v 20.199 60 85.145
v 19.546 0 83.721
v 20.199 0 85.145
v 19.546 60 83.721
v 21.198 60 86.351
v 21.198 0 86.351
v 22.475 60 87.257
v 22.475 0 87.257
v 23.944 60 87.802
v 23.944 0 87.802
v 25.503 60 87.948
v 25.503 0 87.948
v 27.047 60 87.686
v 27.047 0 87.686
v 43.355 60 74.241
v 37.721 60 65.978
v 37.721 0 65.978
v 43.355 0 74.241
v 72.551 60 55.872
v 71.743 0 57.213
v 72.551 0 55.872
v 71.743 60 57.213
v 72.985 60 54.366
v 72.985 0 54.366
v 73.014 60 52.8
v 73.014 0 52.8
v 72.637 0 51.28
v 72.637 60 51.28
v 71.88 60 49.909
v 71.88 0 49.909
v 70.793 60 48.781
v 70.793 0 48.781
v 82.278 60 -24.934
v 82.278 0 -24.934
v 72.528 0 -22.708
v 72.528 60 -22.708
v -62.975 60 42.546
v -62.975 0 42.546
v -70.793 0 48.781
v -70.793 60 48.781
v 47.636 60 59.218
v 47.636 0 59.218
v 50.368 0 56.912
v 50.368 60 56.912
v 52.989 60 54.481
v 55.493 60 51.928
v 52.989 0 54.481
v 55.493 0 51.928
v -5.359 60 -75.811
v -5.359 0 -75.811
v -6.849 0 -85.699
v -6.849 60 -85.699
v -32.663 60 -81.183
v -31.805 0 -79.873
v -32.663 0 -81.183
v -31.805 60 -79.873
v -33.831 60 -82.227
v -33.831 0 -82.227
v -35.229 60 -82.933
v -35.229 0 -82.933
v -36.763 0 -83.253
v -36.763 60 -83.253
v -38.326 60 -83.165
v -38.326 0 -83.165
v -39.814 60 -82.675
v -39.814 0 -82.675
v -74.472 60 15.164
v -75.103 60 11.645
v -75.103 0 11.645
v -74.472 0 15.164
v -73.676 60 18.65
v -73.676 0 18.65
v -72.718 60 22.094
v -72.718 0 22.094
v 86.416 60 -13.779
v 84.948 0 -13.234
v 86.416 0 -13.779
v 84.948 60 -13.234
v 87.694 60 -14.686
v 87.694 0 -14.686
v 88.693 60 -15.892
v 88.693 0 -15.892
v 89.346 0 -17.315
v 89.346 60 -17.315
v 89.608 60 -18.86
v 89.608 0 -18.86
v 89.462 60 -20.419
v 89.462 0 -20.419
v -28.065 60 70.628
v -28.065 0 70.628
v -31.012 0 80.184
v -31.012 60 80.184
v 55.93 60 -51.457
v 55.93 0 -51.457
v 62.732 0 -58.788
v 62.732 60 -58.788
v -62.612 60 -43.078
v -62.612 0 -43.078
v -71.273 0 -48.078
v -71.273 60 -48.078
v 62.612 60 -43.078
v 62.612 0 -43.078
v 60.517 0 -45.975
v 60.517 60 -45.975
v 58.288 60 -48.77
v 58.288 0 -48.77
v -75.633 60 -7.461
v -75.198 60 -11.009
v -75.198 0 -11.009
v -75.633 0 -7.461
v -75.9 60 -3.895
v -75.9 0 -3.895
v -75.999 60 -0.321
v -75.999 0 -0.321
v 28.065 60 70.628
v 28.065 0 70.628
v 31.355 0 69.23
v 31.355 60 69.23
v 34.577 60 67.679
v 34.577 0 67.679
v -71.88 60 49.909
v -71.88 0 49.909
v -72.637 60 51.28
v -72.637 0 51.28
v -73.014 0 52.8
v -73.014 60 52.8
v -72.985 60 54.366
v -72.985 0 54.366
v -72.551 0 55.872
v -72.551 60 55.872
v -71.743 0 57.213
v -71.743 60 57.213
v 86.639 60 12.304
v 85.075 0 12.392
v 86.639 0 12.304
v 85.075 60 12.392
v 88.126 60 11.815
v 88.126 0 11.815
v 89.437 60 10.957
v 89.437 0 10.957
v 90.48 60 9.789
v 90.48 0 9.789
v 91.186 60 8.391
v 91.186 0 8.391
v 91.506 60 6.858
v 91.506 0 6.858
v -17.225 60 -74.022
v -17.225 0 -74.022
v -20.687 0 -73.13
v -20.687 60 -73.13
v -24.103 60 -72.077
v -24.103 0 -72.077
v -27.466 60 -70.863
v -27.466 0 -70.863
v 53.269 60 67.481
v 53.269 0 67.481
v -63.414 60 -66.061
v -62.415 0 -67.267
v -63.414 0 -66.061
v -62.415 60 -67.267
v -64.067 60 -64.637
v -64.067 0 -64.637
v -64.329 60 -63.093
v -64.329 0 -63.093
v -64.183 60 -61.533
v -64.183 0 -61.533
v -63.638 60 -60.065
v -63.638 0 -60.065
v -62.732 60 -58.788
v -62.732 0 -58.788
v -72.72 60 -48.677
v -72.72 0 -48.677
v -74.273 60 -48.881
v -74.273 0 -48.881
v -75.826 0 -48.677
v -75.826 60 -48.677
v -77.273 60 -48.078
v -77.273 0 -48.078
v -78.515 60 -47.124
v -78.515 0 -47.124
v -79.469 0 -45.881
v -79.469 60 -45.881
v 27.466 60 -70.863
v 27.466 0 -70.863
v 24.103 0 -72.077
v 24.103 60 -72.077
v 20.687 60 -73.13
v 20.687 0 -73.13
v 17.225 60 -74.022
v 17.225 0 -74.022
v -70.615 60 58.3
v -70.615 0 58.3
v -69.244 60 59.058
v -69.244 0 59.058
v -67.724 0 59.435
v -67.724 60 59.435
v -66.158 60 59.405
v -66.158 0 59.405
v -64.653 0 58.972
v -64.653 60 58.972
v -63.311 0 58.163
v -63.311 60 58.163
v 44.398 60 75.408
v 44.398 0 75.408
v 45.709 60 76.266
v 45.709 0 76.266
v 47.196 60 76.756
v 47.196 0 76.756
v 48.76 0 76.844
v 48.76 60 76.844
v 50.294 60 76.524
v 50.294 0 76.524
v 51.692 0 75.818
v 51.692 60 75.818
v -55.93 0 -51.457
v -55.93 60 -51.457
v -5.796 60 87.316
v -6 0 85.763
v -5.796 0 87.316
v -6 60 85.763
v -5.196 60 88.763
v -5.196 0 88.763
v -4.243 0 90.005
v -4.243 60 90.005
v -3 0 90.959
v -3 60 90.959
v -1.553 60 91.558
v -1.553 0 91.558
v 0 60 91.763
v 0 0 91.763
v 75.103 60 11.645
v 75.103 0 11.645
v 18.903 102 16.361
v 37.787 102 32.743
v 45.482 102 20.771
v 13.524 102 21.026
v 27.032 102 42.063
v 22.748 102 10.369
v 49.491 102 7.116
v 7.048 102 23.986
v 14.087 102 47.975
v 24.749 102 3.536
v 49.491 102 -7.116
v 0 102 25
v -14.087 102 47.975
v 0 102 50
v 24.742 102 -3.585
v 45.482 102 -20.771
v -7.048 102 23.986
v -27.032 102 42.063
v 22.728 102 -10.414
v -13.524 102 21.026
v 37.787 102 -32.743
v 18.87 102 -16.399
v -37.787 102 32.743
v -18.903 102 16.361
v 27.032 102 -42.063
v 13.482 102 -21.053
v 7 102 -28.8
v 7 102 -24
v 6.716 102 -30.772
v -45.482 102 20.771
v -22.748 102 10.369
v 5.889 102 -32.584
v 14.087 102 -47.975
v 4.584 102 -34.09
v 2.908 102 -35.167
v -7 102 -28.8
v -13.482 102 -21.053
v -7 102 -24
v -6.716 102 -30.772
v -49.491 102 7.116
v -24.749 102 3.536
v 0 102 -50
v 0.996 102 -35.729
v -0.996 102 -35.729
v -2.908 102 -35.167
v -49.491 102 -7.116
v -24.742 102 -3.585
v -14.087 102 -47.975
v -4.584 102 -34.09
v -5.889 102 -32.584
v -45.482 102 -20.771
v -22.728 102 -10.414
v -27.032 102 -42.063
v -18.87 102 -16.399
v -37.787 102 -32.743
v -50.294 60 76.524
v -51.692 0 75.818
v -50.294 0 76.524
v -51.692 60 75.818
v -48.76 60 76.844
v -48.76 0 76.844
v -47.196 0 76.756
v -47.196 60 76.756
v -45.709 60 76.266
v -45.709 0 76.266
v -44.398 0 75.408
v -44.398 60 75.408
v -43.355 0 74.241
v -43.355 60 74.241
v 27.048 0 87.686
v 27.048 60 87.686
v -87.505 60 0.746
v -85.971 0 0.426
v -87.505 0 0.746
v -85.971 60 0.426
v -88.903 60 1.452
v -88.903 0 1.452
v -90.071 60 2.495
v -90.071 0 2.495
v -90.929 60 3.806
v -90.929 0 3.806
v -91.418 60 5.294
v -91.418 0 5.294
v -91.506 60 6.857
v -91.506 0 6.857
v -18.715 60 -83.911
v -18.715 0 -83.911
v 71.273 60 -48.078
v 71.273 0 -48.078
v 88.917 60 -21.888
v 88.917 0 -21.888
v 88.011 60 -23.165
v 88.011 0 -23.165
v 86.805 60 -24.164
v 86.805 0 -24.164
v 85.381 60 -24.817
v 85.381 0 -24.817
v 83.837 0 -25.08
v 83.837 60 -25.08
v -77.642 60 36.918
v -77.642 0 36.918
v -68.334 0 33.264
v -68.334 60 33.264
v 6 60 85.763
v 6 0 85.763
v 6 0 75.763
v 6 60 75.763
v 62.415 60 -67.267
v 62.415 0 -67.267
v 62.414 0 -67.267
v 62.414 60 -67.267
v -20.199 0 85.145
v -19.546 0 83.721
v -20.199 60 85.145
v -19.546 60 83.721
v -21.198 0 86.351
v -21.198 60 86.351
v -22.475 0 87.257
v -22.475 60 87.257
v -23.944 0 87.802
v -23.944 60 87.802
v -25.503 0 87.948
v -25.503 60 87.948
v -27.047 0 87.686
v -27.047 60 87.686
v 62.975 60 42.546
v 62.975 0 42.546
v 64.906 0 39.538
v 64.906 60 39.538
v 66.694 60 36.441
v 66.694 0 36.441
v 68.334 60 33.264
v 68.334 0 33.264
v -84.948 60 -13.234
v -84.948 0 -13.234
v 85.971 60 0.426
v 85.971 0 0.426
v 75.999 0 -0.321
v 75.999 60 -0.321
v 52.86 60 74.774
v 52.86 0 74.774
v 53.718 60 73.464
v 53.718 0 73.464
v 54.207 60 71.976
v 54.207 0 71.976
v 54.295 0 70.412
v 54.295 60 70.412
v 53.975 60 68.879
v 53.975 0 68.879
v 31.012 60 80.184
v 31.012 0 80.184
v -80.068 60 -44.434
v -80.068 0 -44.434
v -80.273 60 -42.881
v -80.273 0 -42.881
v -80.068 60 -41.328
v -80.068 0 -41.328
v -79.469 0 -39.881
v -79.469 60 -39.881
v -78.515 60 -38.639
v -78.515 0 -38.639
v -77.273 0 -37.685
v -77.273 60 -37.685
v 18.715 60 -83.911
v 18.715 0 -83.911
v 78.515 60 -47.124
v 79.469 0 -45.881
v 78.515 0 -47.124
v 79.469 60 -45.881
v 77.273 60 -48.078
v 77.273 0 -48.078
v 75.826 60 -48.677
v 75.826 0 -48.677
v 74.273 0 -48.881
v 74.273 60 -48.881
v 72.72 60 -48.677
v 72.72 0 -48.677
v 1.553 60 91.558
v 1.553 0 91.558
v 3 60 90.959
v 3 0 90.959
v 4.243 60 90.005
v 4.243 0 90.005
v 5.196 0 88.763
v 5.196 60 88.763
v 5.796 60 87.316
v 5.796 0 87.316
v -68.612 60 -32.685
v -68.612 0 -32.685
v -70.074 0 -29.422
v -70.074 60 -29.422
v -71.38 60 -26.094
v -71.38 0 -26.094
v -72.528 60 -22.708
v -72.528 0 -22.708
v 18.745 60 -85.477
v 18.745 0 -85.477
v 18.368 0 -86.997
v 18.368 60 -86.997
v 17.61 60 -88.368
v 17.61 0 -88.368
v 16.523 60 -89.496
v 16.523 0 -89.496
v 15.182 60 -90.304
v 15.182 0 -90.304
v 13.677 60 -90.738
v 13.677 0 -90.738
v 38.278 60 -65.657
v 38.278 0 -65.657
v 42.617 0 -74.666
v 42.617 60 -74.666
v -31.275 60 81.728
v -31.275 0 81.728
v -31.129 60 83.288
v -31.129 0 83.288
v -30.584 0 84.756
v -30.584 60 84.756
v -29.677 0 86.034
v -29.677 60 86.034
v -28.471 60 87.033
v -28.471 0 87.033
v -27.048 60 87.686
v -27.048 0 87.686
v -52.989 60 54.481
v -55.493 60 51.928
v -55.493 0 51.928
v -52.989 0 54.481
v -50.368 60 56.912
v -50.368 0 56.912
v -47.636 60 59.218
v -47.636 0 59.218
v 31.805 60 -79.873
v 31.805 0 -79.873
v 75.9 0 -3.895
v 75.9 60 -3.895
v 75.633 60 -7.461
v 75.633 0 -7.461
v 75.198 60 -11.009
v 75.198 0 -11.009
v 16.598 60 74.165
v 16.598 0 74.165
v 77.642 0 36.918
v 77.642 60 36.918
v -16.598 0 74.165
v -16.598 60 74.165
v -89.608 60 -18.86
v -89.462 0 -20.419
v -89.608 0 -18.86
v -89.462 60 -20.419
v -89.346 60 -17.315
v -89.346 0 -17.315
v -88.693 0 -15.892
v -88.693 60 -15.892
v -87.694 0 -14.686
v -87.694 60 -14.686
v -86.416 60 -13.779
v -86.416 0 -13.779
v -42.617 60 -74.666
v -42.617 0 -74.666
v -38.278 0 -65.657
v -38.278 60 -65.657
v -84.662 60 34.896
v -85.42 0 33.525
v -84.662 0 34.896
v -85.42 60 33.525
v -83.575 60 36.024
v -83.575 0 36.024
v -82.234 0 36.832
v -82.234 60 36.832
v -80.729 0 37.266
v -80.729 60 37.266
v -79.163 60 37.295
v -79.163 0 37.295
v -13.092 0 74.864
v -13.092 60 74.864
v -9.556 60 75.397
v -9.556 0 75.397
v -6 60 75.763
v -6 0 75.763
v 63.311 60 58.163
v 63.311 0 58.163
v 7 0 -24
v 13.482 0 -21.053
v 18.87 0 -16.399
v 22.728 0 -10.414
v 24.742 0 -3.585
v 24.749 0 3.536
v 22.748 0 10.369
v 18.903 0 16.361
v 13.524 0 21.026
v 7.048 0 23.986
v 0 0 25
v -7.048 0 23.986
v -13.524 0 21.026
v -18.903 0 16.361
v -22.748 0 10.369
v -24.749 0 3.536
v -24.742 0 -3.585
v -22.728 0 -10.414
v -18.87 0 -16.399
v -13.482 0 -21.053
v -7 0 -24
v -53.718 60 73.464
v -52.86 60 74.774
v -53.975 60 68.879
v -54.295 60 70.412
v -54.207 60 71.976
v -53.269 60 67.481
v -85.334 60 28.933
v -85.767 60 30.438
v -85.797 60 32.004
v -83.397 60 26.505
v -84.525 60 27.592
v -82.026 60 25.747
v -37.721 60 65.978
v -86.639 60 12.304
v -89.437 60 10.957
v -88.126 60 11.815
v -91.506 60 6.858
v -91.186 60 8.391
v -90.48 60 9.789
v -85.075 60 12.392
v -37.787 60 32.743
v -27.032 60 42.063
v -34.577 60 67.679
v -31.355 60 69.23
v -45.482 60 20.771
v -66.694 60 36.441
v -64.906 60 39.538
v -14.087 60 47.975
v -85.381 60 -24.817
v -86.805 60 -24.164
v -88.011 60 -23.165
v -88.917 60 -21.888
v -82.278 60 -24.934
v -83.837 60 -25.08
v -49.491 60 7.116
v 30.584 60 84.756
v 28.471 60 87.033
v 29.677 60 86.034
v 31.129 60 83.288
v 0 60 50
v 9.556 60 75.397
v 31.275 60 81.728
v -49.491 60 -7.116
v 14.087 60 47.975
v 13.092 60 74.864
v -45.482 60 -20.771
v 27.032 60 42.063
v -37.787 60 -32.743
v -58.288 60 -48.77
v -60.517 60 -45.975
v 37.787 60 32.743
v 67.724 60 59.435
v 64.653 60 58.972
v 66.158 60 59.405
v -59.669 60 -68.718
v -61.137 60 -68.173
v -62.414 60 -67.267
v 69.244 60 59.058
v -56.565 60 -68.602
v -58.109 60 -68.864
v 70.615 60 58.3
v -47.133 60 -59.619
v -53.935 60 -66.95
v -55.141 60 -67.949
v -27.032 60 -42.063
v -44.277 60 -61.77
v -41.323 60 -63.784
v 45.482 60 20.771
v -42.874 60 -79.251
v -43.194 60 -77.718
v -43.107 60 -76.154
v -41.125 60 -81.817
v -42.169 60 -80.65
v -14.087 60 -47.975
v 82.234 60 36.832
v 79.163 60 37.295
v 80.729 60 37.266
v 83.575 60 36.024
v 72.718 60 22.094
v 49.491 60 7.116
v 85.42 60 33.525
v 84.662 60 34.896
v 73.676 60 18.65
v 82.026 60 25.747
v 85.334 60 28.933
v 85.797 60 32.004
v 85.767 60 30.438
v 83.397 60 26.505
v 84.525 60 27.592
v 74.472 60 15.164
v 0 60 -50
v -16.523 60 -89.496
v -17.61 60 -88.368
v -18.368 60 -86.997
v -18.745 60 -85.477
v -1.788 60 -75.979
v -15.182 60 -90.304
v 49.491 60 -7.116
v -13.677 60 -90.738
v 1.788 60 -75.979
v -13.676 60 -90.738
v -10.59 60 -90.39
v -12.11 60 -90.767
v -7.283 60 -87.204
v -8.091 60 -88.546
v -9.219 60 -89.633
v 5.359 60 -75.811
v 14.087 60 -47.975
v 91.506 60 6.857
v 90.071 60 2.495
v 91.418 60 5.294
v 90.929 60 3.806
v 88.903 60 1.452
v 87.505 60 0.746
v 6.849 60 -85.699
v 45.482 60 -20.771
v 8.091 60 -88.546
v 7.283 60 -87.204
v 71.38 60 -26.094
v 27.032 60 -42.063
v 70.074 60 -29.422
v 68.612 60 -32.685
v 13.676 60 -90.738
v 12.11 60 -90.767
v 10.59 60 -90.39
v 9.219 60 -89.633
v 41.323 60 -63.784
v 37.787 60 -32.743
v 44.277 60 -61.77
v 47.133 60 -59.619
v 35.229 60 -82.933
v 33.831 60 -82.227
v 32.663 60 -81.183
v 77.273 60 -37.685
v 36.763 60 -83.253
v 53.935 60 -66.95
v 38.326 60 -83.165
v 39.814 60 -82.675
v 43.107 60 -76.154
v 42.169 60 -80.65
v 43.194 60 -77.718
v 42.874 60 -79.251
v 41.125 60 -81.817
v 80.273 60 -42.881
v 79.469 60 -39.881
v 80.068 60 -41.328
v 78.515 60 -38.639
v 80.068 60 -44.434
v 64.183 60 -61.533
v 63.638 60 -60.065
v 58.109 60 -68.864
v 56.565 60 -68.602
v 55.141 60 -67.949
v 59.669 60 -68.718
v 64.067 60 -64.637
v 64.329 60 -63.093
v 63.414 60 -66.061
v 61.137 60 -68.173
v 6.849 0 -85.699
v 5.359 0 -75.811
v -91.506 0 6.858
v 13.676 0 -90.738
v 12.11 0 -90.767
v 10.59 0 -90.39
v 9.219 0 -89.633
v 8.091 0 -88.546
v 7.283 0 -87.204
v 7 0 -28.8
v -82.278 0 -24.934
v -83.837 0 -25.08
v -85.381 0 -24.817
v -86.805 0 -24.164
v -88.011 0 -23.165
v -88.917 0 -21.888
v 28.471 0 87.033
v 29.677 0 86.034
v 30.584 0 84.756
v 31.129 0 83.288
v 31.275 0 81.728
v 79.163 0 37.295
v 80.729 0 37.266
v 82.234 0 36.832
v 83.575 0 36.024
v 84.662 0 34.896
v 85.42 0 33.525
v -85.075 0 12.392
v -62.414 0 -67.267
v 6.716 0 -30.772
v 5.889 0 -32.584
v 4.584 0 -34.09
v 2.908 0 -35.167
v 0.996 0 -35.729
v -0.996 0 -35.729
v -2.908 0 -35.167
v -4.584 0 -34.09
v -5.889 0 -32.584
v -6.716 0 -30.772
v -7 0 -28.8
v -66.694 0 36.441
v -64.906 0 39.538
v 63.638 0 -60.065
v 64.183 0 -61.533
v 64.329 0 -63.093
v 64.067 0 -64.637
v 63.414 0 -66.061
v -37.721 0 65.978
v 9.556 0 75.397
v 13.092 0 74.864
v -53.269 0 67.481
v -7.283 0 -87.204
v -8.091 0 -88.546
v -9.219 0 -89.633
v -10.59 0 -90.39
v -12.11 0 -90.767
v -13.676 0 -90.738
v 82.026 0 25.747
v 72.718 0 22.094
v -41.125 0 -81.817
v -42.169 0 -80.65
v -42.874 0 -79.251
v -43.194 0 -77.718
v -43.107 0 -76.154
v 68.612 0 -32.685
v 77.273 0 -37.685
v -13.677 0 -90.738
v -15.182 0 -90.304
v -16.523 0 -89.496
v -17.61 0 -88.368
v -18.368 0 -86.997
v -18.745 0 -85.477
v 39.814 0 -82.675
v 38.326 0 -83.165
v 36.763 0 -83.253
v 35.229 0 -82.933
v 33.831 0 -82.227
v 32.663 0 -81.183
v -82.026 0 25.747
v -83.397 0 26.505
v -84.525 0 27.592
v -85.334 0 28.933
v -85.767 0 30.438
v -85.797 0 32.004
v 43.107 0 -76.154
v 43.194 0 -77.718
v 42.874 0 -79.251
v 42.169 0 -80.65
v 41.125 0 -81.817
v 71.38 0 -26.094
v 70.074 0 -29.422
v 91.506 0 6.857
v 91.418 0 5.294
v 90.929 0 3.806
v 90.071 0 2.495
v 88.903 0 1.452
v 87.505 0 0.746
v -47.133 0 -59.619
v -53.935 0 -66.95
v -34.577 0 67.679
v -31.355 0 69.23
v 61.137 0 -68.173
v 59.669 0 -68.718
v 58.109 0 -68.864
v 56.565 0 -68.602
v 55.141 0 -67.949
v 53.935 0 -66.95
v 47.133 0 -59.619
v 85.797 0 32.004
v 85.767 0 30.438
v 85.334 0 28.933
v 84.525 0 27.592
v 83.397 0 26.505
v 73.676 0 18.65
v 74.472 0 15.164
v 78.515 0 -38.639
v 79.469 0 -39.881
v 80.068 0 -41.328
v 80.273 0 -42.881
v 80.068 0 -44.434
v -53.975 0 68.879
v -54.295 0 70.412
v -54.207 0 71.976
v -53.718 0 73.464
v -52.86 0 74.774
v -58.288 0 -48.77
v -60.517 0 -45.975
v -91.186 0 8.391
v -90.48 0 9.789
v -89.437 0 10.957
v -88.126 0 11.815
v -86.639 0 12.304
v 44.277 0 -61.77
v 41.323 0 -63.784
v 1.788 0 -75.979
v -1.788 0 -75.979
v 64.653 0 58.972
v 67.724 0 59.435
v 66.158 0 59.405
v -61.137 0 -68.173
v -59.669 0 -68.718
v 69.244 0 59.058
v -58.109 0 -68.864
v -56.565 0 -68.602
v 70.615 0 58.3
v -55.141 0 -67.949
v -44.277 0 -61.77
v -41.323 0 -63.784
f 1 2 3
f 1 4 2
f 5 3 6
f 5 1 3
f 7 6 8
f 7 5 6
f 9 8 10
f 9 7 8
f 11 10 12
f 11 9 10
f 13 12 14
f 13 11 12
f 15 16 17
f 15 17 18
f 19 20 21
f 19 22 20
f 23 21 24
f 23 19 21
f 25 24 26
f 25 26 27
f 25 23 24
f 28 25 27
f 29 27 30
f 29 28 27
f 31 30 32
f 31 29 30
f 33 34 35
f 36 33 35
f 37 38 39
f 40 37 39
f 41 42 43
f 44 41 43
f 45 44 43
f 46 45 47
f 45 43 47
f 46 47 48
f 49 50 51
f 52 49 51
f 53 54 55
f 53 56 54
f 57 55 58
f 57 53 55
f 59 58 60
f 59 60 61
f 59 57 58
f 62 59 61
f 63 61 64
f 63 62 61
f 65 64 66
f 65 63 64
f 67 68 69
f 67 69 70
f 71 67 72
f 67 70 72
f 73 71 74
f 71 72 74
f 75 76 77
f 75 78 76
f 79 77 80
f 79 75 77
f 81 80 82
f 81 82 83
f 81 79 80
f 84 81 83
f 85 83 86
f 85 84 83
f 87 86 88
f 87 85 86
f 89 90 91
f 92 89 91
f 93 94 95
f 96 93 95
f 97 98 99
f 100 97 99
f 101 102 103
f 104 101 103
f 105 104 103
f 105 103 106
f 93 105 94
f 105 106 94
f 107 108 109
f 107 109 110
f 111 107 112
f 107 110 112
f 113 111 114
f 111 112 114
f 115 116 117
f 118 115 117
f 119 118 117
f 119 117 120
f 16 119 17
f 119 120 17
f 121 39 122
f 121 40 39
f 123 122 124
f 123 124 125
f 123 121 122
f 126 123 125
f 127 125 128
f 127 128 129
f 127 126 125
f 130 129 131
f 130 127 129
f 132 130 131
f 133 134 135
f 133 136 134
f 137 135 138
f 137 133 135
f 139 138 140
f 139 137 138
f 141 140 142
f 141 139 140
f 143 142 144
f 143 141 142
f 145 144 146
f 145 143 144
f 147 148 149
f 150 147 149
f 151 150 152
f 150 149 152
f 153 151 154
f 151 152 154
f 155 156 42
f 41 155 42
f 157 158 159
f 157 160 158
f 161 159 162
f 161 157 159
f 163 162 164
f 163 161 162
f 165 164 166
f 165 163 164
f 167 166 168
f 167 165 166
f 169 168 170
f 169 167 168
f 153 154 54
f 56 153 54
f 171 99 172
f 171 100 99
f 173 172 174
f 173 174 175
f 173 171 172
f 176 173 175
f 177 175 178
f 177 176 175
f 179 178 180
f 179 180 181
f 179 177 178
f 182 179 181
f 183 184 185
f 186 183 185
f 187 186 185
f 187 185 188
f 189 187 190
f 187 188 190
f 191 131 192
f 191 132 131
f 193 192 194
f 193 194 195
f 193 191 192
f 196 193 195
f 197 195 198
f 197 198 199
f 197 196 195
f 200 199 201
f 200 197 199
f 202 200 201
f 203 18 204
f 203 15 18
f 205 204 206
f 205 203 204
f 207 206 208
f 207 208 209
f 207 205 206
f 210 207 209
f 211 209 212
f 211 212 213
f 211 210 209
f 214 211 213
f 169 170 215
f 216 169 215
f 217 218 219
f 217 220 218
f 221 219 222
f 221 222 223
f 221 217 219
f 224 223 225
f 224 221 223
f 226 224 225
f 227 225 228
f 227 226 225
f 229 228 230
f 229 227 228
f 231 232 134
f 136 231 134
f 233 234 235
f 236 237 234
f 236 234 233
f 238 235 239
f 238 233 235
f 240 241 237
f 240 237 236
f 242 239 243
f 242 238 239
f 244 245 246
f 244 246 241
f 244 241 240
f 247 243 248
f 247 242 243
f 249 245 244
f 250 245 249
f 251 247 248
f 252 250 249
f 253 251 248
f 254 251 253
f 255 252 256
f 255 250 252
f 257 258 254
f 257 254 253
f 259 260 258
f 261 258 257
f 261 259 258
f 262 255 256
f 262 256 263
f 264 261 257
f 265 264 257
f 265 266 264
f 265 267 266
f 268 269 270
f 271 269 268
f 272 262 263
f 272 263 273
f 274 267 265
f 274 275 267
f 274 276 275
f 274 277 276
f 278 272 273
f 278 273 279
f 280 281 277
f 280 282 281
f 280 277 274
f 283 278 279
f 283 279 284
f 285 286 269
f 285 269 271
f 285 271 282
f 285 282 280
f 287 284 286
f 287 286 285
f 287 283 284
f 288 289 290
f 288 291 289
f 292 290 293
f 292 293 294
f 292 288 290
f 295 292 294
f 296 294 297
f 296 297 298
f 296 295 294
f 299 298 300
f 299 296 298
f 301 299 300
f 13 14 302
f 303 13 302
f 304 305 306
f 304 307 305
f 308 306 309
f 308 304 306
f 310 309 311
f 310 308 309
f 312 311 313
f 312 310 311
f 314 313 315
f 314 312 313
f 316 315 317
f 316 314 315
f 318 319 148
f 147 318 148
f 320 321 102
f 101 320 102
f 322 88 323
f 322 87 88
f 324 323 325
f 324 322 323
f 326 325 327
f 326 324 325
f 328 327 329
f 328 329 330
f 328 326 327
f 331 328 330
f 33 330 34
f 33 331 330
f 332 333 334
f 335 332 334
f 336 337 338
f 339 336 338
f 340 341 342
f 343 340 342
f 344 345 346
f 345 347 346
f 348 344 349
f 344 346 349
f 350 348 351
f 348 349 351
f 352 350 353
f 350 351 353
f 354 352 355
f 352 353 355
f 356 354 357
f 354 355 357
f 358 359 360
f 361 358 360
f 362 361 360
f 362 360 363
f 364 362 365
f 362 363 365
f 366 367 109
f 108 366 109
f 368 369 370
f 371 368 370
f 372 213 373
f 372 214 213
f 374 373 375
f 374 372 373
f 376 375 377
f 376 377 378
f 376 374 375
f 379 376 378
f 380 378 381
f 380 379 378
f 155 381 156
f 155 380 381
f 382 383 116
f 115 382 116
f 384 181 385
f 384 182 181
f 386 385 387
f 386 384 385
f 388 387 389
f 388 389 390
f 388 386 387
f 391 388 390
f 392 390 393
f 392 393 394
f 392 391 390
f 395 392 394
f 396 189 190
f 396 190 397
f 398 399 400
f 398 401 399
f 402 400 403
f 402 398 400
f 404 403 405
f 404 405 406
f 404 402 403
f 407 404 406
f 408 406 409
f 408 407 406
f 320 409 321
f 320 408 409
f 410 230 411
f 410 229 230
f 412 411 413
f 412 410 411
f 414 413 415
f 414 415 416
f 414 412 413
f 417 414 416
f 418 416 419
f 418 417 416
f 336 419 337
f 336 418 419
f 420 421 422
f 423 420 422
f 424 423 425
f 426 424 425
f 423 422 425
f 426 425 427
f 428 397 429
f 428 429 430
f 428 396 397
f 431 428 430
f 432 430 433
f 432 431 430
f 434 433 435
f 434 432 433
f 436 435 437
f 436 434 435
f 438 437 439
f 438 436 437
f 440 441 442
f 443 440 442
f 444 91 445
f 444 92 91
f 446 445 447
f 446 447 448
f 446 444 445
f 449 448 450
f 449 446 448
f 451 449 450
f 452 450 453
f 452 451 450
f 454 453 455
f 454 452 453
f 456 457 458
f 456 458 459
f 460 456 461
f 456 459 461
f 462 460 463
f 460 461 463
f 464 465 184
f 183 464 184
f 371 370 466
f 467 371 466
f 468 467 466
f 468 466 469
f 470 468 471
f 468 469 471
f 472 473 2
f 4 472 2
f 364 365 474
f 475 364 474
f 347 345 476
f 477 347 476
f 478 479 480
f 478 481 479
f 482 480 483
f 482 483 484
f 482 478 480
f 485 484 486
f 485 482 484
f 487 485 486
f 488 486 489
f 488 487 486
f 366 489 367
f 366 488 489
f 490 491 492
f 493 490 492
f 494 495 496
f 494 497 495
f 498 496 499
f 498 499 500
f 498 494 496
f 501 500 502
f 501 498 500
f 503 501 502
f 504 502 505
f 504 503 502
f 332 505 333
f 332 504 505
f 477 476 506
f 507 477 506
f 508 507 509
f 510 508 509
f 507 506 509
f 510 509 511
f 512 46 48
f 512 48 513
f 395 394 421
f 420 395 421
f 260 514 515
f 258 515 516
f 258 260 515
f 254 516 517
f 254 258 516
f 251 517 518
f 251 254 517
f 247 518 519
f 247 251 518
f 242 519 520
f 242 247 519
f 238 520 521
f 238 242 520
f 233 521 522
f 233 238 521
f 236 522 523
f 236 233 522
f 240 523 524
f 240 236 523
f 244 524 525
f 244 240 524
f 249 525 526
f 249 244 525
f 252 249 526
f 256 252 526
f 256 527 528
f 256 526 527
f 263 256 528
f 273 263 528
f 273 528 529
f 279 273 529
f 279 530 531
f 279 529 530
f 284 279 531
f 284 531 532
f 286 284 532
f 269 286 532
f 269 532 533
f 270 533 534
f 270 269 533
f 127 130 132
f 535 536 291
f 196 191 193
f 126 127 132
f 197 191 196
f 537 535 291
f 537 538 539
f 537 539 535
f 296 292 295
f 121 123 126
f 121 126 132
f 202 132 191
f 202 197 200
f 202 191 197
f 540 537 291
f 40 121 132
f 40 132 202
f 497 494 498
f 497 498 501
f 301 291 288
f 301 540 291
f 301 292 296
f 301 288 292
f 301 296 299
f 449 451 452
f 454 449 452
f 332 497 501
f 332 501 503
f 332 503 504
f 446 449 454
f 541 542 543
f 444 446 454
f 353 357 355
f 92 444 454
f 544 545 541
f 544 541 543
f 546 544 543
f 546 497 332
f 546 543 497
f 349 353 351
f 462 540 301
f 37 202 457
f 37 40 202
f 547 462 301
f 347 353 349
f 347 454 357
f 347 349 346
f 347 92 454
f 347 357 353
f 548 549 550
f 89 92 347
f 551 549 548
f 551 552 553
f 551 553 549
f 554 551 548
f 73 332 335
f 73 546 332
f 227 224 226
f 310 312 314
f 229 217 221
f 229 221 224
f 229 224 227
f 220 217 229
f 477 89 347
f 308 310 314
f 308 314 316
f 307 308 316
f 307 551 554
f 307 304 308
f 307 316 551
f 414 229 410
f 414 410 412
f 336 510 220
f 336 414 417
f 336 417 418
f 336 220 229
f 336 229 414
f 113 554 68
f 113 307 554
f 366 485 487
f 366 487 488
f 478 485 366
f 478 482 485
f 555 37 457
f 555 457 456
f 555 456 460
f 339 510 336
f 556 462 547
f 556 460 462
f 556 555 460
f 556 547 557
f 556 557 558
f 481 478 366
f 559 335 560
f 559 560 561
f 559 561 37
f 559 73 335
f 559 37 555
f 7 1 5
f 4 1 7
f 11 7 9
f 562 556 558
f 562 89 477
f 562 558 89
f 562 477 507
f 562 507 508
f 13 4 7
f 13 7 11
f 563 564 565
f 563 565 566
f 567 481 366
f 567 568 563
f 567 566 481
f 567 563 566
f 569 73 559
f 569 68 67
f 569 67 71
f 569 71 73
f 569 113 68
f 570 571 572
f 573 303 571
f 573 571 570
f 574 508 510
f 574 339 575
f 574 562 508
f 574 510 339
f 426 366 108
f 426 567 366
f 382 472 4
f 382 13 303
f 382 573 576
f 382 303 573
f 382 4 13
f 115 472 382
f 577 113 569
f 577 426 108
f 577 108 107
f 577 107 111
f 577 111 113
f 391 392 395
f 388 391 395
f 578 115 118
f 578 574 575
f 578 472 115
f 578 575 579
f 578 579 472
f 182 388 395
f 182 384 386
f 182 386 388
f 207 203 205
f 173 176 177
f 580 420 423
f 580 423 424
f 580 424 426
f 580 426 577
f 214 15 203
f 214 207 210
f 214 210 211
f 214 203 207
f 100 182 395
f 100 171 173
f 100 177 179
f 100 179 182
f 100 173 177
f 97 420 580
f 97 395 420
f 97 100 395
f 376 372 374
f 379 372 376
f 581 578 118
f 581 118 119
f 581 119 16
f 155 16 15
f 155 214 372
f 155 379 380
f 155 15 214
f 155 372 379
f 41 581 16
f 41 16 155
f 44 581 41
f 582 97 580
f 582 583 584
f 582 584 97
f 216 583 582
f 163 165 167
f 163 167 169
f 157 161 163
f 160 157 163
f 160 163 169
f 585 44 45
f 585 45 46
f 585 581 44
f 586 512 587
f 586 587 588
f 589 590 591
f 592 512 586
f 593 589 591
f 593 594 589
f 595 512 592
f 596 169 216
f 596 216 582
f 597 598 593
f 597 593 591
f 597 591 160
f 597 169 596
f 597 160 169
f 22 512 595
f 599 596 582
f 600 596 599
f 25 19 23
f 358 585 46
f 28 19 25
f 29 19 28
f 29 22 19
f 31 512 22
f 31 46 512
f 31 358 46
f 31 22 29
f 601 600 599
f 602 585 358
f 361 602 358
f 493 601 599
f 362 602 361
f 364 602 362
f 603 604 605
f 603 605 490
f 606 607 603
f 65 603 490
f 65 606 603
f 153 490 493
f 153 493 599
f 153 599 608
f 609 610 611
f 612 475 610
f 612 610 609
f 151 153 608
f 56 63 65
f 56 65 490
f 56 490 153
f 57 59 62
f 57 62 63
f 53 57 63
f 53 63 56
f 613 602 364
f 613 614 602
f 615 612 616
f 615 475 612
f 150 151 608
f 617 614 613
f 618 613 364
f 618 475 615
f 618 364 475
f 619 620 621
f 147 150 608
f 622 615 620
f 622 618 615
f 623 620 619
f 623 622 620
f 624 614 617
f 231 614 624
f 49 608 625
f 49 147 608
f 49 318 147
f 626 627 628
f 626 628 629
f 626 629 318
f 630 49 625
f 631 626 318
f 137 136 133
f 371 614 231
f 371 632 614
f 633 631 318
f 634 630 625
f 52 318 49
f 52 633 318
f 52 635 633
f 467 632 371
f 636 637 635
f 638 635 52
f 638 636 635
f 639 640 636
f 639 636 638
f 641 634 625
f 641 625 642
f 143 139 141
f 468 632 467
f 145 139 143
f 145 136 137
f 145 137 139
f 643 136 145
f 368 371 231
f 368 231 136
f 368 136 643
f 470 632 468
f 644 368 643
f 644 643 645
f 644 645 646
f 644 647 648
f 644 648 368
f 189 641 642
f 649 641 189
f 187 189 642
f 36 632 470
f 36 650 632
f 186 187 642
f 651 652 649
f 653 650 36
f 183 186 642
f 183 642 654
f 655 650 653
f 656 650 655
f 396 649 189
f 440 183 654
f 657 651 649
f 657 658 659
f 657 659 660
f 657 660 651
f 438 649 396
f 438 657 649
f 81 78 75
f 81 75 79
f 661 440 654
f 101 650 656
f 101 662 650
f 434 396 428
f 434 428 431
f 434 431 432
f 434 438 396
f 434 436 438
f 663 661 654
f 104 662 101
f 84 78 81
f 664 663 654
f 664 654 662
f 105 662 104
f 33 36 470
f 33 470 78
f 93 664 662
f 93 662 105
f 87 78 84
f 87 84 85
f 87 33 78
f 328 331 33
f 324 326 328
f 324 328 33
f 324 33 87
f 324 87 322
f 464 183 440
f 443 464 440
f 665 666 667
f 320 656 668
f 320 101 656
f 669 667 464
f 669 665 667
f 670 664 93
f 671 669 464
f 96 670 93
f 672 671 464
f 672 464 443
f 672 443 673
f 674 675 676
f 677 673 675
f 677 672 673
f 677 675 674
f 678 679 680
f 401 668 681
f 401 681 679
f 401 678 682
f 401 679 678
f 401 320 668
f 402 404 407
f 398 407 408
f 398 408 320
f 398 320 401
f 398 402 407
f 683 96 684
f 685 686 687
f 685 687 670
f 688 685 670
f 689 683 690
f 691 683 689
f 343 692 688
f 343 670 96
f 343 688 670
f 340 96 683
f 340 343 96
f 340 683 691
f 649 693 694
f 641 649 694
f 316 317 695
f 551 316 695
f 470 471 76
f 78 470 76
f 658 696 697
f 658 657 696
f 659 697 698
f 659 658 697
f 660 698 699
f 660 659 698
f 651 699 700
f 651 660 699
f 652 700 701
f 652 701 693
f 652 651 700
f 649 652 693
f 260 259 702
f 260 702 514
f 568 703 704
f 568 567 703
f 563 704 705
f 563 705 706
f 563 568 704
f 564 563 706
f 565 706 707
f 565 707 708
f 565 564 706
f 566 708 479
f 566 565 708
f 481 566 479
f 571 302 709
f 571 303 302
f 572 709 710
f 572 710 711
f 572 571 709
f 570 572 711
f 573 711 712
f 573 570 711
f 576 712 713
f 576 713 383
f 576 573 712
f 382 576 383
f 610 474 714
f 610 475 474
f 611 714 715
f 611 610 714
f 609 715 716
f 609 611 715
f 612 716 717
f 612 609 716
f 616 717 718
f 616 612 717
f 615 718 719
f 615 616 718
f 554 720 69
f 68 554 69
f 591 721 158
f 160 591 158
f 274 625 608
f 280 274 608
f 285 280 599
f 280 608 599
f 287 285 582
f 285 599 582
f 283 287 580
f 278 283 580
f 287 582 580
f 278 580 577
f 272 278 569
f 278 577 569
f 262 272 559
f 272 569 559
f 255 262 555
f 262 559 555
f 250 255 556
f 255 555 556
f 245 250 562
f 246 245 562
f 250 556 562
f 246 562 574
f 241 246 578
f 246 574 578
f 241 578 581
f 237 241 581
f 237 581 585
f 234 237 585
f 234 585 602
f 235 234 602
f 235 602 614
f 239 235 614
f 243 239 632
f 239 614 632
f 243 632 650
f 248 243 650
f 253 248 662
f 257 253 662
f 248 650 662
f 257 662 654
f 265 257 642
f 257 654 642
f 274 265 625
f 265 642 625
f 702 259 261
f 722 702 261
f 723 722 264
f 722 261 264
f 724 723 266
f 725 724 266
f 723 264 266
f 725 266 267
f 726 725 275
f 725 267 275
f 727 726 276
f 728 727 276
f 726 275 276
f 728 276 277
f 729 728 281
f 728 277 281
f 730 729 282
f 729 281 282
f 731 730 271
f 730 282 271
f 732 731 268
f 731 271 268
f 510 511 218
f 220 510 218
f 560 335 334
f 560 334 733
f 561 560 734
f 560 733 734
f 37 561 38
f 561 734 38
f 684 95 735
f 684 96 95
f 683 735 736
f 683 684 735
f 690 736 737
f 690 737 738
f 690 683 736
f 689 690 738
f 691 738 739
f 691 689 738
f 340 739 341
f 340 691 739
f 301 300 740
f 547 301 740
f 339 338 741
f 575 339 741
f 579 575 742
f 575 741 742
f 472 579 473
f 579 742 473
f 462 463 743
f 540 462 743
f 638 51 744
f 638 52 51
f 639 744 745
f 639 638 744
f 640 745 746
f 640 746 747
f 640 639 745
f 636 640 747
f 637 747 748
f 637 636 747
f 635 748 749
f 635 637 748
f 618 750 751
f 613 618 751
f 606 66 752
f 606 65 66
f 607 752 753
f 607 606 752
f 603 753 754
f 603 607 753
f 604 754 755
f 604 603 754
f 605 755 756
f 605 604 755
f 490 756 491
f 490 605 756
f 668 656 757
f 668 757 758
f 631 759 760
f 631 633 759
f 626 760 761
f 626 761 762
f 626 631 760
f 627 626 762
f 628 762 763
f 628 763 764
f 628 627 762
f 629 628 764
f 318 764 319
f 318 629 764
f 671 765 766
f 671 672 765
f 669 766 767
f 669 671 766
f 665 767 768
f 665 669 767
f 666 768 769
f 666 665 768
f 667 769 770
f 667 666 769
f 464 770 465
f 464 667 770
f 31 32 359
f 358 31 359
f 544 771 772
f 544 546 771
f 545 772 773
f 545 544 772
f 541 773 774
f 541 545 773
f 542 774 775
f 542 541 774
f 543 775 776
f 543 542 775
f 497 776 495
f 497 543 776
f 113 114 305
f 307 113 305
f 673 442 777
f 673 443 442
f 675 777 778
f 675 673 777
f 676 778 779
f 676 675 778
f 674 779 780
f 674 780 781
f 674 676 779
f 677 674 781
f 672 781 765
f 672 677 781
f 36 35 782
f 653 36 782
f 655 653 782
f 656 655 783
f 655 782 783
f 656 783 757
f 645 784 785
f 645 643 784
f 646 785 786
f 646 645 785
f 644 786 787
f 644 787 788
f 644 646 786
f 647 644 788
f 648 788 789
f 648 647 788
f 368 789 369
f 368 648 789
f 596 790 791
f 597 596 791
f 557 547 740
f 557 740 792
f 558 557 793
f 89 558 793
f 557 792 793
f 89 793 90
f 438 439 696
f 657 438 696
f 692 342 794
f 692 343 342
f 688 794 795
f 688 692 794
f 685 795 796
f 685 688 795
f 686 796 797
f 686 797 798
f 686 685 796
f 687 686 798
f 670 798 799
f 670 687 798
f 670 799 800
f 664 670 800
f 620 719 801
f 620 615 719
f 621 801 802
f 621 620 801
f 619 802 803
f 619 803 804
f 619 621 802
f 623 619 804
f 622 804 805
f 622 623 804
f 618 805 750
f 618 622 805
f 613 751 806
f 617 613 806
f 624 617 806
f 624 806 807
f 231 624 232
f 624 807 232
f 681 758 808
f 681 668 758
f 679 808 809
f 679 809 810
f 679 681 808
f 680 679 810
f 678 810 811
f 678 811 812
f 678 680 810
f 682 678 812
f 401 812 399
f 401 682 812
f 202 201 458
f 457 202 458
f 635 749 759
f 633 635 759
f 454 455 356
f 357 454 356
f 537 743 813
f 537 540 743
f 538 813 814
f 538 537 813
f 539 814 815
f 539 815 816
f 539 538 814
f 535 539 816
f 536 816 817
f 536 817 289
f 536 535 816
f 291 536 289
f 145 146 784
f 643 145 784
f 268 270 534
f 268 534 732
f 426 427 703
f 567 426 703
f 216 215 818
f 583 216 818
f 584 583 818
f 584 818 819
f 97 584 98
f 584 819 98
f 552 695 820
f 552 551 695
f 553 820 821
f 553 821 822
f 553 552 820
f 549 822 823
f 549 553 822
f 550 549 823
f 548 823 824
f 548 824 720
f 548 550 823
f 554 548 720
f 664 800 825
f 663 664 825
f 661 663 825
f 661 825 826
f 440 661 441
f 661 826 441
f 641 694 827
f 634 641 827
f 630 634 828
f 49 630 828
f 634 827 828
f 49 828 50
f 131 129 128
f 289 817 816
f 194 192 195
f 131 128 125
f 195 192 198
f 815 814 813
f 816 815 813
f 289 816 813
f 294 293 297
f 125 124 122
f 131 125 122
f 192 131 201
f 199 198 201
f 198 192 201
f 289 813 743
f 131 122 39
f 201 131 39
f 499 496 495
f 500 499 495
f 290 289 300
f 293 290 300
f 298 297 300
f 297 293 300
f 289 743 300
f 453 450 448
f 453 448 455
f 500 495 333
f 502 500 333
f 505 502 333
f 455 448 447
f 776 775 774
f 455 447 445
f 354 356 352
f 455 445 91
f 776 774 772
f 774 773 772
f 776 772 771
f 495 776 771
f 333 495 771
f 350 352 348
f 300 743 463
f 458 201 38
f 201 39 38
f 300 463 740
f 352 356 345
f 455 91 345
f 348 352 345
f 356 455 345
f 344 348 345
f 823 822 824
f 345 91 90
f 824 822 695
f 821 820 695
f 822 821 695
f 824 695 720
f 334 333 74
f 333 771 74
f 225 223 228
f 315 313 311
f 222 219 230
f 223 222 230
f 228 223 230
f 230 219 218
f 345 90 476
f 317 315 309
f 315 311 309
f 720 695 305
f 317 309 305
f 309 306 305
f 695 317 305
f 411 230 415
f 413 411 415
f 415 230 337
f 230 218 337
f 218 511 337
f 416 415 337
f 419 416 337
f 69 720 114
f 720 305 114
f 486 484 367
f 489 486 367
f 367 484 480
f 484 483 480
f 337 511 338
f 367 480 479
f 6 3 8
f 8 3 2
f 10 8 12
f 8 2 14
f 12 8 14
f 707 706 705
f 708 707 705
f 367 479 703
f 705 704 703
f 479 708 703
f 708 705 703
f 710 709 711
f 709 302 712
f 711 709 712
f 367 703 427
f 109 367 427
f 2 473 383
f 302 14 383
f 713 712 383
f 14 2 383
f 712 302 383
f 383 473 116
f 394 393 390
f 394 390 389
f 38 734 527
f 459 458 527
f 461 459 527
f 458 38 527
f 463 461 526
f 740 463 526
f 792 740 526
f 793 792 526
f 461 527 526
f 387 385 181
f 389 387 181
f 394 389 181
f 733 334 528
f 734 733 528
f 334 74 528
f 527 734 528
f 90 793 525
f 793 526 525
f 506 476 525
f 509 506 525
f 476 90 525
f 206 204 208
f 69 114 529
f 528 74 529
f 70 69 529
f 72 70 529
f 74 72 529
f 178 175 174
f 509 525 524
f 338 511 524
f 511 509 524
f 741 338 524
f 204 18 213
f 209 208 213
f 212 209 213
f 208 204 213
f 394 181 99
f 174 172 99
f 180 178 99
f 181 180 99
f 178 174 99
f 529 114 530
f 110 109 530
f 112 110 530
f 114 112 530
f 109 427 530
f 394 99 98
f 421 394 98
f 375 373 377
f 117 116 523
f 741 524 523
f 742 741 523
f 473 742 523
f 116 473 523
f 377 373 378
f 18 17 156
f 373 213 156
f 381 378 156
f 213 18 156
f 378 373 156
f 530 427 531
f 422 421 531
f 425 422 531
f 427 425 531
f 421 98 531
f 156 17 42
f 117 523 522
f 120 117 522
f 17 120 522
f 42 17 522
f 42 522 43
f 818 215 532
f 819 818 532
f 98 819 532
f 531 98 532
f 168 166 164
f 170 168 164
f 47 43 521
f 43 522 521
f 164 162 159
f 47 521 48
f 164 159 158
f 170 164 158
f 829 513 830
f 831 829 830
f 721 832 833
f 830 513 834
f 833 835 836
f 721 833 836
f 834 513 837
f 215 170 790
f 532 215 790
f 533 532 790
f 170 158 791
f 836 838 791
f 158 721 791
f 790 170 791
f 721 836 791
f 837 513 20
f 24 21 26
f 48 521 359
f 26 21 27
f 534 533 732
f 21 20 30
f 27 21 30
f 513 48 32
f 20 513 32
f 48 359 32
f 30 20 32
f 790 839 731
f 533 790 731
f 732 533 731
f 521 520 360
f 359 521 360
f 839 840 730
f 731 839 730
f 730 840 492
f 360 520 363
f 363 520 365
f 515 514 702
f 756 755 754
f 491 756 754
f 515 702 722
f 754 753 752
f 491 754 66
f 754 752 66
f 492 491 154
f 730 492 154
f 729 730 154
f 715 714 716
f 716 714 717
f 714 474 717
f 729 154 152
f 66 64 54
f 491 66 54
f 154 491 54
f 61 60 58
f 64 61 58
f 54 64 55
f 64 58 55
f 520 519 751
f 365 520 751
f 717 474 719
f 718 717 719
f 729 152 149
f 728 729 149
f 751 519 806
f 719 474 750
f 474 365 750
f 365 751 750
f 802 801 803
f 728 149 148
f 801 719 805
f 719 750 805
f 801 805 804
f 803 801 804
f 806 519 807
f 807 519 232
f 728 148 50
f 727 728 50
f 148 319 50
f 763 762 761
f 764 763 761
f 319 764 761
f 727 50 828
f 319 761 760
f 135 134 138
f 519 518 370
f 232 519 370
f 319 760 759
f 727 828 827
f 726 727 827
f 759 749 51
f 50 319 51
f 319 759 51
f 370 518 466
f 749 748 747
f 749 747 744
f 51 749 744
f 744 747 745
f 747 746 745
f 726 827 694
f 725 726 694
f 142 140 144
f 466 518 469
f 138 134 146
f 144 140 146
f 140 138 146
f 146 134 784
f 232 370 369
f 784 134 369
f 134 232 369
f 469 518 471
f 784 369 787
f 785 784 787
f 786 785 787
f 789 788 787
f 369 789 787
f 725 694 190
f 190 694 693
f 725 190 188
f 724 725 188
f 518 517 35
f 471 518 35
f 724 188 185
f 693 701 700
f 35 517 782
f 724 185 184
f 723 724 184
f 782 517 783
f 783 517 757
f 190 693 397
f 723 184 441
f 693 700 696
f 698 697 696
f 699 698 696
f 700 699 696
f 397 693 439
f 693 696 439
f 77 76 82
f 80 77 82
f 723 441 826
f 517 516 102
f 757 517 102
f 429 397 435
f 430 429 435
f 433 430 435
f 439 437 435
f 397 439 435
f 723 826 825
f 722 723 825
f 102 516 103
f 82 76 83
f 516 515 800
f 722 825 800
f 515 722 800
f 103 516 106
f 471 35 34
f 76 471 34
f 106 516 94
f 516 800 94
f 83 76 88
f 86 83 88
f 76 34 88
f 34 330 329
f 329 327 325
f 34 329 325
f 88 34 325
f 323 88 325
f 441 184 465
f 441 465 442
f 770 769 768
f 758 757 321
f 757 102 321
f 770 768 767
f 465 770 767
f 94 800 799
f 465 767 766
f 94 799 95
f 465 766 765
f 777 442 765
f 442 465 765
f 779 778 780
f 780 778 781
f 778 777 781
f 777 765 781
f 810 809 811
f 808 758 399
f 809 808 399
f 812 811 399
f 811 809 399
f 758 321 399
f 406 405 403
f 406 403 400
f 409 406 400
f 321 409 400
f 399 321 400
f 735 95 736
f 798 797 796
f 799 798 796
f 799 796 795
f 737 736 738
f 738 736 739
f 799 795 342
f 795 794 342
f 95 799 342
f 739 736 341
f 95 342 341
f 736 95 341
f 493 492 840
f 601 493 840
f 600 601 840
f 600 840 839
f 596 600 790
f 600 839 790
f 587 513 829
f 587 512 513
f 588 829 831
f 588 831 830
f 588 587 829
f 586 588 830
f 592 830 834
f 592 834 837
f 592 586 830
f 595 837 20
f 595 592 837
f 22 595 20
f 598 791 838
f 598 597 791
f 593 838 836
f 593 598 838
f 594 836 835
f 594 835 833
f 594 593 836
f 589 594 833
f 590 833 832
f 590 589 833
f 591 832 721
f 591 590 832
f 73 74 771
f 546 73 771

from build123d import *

# Parameters (mm, degrees)
SKETCH_1_R                       = 76
EXTRUDE_1_DEPTH                  = 60
SKETCH_2_R                       = 50
EXTRUDE_2_DEPTH                  = 42
CUT_EXTRUDE_1_DEPTH              = 149.175571536
SKETCH_4_R                       = 7
CUT_EXTRUDE_2_DEPTH              = 149.175571536
EXTRUDE_3_DEPTH                  = 60
FILLET_1_R                       = 6
PATTERN_CIRCULAR_1_COUNT         = 21
FILLET_1_OF_PATTERN_CIRCULAR_1_R = 6


with BuildPart() as part:
    # 草图1 → 凸台-拉伸1 (new body)
    with BuildSketch(Plane(origin=(0, 0, 0), x_dir=(1, 0, 0), z_dir=(0, 1, 0))):
        with Locations(Location((0, 0, 0), (0, 0, 270))):
            Circle(SKETCH_1_R)
    extrude(amount=EXTRUDE_1_DEPTH)

    # 草图2 → 凸台-拉伸2 (add)
    with BuildSketch(Plane(origin=(0, 60, 0), x_dir=(1, 0, 0), z_dir=(0, 1, 0))):
        with Locations(Location((0, 0, 0), (0, 0, 90))):
            Circle(SKETCH_2_R)
    extrude(amount=EXTRUDE_2_DEPTH)

    # 草图3 → 切除-拉伸1 (cut, through all)
    with BuildSketch(Plane(origin=(0, 102, 0), x_dir=(1, 0, 0), z_dir=(0, 1, 0))):
        with BuildLine():
            Line((-7, 24), (-7, 28.8))
            Line((-7, 28.8), (7, 28.8))
            Line((7, 28.8), (7, 24))
            ThreePointArc((7, 24), (0, -25), (-7, 24))
        make_face()
    extrude(amount=-CUT_EXTRUDE_1_DEPTH, mode=Mode.SUBTRACT)

    # 草图4 → 切除-拉伸2 (cut, through all)
    with BuildSketch(Plane(origin=(0, 102, 0), x_dir=(1, 0, 0), z_dir=(0, 1, 0))):
        with Locations((0, 28.8)):
            Circle(SKETCH_4_R)
    extrude(amount=-CUT_EXTRUDE_2_DEPTH, mode=Mode.SUBTRACT)

    # 草图5 → 凸台-拉伸3 (add)
    with BuildSketch(Plane(origin=(0, 0, 0), x_dir=(-1, 0, 0), z_dir=(0, -1, 0))):
        with BuildLine():
            Line((6, -75.7627877), (6, -91.7627877))
            Line((6, -91.7627877), (-6, -91.7627877))
            Line((-6, -91.7627877), (-6, -75.7627877))
            ThreePointArc((-6, -75.7627877), (0, -76), (6, -75.7627877))
        make_face()
    extrude_3 = extrude(amount=-EXTRUDE_3_DEPTH)

    # 圆角1
    fillet_1_edges = [part.edges().sort_by_distance(p)[0] for p in [
        (-6, 30, 91.7627877),
        (6, 30, 91.7627877),
    ]]
    fillet(fillet_1_edges, radius=FILLET_1_R - 0.0001)  # a hair under: the kernel refuses the full size

    # 阵列(圆周)1: 凸台-拉伸3 ×21 about axis
    pattern_circular_1_axis = Axis((0, 0, 0), (0, 1, 0))
    for i in range(1, PATTERN_CIRCULAR_1_COUNT):
        add(extrude_3.rotate(pattern_circular_1_axis, i * 360 / PATTERN_CIRCULAR_1_COUNT))

    # 圆角1 of 阵列(圆周)1
    fillet_1_of_pattern_circular_1_edges = [part.edges().sort_by_distance(p)[0] for p in [
        (21.314119658, 30, 89.454555555),
        (32.780993328, 30, 85.917493462),
        (46.734386249, 30, 79.197893585),
        (56.649251541, 30, 72.438052888),
        (68.002097531, 30, 61.904151216),
        (75.483975154, 30, 52.522173426),
        (83.227524026, 30, 39.109953349),
        (87.611616318, 30, 27.939468365),
        (91.057819772, 30, 12.840664496),
        (91.954580895, 30, 0.874218929),
        (90.797228632, 30, -14.569573748),
        (88.126977424, 30, -26.268708694),
        (82.46890527, 30, -40.685241427),
        (76.46890527, 30, -51.077546272),
        (66.812857766, 30, -63.185846861),
        (58.016235304, 30, -71.347919714),
        (45.220194646, 30, -80.072112514),
        (34.408568231, 30, -85.278717384),
        (19.609518787, 30, -89.843619581),
        (7.743548872, 30, -91.632126775),
        (-7.743548872, 30, -91.632126775),
        (-19.609518787, 30, -89.843619581),
        (-34.408568231, 30, -85.278717384),
        (-45.220194646, 30, -80.072112514),
        (-58.016235304, 30, -71.347919714),
        (-66.812857766, 30, -63.185846861),
        (-76.46890527, 30, -51.077546272),
        (-82.46890527, 30, -40.685241427),
        (-88.126977424, 30, -26.268708694),
        (-90.797228632, 30, -14.569573748),
        (-91.954580895, 30, 0.874218929),
        (-91.057819772, 30, 12.840664496),
        (-87.611616318, 30, 27.939468365),
        (-83.227524026, 30, 39.109953349),
        (-75.483975154, 30, 52.522173426),
        (-68.002097531, 30, 61.904151216),
        (-56.649251541, 30, 72.438052888),
        (-46.734386249, 30, 79.197893585),
        (-32.780993328, 30, 85.917493462),
        (-21.314119658, 30, 89.454555555),
    ]]
    fillet(fillet_1_of_pattern_circular_1_edges, radius=FILLET_1_OF_PATTERN_CIRCULAR_1_R - 0.0001)  # a hair under: the kernel refuses the full size


solid = part.part
